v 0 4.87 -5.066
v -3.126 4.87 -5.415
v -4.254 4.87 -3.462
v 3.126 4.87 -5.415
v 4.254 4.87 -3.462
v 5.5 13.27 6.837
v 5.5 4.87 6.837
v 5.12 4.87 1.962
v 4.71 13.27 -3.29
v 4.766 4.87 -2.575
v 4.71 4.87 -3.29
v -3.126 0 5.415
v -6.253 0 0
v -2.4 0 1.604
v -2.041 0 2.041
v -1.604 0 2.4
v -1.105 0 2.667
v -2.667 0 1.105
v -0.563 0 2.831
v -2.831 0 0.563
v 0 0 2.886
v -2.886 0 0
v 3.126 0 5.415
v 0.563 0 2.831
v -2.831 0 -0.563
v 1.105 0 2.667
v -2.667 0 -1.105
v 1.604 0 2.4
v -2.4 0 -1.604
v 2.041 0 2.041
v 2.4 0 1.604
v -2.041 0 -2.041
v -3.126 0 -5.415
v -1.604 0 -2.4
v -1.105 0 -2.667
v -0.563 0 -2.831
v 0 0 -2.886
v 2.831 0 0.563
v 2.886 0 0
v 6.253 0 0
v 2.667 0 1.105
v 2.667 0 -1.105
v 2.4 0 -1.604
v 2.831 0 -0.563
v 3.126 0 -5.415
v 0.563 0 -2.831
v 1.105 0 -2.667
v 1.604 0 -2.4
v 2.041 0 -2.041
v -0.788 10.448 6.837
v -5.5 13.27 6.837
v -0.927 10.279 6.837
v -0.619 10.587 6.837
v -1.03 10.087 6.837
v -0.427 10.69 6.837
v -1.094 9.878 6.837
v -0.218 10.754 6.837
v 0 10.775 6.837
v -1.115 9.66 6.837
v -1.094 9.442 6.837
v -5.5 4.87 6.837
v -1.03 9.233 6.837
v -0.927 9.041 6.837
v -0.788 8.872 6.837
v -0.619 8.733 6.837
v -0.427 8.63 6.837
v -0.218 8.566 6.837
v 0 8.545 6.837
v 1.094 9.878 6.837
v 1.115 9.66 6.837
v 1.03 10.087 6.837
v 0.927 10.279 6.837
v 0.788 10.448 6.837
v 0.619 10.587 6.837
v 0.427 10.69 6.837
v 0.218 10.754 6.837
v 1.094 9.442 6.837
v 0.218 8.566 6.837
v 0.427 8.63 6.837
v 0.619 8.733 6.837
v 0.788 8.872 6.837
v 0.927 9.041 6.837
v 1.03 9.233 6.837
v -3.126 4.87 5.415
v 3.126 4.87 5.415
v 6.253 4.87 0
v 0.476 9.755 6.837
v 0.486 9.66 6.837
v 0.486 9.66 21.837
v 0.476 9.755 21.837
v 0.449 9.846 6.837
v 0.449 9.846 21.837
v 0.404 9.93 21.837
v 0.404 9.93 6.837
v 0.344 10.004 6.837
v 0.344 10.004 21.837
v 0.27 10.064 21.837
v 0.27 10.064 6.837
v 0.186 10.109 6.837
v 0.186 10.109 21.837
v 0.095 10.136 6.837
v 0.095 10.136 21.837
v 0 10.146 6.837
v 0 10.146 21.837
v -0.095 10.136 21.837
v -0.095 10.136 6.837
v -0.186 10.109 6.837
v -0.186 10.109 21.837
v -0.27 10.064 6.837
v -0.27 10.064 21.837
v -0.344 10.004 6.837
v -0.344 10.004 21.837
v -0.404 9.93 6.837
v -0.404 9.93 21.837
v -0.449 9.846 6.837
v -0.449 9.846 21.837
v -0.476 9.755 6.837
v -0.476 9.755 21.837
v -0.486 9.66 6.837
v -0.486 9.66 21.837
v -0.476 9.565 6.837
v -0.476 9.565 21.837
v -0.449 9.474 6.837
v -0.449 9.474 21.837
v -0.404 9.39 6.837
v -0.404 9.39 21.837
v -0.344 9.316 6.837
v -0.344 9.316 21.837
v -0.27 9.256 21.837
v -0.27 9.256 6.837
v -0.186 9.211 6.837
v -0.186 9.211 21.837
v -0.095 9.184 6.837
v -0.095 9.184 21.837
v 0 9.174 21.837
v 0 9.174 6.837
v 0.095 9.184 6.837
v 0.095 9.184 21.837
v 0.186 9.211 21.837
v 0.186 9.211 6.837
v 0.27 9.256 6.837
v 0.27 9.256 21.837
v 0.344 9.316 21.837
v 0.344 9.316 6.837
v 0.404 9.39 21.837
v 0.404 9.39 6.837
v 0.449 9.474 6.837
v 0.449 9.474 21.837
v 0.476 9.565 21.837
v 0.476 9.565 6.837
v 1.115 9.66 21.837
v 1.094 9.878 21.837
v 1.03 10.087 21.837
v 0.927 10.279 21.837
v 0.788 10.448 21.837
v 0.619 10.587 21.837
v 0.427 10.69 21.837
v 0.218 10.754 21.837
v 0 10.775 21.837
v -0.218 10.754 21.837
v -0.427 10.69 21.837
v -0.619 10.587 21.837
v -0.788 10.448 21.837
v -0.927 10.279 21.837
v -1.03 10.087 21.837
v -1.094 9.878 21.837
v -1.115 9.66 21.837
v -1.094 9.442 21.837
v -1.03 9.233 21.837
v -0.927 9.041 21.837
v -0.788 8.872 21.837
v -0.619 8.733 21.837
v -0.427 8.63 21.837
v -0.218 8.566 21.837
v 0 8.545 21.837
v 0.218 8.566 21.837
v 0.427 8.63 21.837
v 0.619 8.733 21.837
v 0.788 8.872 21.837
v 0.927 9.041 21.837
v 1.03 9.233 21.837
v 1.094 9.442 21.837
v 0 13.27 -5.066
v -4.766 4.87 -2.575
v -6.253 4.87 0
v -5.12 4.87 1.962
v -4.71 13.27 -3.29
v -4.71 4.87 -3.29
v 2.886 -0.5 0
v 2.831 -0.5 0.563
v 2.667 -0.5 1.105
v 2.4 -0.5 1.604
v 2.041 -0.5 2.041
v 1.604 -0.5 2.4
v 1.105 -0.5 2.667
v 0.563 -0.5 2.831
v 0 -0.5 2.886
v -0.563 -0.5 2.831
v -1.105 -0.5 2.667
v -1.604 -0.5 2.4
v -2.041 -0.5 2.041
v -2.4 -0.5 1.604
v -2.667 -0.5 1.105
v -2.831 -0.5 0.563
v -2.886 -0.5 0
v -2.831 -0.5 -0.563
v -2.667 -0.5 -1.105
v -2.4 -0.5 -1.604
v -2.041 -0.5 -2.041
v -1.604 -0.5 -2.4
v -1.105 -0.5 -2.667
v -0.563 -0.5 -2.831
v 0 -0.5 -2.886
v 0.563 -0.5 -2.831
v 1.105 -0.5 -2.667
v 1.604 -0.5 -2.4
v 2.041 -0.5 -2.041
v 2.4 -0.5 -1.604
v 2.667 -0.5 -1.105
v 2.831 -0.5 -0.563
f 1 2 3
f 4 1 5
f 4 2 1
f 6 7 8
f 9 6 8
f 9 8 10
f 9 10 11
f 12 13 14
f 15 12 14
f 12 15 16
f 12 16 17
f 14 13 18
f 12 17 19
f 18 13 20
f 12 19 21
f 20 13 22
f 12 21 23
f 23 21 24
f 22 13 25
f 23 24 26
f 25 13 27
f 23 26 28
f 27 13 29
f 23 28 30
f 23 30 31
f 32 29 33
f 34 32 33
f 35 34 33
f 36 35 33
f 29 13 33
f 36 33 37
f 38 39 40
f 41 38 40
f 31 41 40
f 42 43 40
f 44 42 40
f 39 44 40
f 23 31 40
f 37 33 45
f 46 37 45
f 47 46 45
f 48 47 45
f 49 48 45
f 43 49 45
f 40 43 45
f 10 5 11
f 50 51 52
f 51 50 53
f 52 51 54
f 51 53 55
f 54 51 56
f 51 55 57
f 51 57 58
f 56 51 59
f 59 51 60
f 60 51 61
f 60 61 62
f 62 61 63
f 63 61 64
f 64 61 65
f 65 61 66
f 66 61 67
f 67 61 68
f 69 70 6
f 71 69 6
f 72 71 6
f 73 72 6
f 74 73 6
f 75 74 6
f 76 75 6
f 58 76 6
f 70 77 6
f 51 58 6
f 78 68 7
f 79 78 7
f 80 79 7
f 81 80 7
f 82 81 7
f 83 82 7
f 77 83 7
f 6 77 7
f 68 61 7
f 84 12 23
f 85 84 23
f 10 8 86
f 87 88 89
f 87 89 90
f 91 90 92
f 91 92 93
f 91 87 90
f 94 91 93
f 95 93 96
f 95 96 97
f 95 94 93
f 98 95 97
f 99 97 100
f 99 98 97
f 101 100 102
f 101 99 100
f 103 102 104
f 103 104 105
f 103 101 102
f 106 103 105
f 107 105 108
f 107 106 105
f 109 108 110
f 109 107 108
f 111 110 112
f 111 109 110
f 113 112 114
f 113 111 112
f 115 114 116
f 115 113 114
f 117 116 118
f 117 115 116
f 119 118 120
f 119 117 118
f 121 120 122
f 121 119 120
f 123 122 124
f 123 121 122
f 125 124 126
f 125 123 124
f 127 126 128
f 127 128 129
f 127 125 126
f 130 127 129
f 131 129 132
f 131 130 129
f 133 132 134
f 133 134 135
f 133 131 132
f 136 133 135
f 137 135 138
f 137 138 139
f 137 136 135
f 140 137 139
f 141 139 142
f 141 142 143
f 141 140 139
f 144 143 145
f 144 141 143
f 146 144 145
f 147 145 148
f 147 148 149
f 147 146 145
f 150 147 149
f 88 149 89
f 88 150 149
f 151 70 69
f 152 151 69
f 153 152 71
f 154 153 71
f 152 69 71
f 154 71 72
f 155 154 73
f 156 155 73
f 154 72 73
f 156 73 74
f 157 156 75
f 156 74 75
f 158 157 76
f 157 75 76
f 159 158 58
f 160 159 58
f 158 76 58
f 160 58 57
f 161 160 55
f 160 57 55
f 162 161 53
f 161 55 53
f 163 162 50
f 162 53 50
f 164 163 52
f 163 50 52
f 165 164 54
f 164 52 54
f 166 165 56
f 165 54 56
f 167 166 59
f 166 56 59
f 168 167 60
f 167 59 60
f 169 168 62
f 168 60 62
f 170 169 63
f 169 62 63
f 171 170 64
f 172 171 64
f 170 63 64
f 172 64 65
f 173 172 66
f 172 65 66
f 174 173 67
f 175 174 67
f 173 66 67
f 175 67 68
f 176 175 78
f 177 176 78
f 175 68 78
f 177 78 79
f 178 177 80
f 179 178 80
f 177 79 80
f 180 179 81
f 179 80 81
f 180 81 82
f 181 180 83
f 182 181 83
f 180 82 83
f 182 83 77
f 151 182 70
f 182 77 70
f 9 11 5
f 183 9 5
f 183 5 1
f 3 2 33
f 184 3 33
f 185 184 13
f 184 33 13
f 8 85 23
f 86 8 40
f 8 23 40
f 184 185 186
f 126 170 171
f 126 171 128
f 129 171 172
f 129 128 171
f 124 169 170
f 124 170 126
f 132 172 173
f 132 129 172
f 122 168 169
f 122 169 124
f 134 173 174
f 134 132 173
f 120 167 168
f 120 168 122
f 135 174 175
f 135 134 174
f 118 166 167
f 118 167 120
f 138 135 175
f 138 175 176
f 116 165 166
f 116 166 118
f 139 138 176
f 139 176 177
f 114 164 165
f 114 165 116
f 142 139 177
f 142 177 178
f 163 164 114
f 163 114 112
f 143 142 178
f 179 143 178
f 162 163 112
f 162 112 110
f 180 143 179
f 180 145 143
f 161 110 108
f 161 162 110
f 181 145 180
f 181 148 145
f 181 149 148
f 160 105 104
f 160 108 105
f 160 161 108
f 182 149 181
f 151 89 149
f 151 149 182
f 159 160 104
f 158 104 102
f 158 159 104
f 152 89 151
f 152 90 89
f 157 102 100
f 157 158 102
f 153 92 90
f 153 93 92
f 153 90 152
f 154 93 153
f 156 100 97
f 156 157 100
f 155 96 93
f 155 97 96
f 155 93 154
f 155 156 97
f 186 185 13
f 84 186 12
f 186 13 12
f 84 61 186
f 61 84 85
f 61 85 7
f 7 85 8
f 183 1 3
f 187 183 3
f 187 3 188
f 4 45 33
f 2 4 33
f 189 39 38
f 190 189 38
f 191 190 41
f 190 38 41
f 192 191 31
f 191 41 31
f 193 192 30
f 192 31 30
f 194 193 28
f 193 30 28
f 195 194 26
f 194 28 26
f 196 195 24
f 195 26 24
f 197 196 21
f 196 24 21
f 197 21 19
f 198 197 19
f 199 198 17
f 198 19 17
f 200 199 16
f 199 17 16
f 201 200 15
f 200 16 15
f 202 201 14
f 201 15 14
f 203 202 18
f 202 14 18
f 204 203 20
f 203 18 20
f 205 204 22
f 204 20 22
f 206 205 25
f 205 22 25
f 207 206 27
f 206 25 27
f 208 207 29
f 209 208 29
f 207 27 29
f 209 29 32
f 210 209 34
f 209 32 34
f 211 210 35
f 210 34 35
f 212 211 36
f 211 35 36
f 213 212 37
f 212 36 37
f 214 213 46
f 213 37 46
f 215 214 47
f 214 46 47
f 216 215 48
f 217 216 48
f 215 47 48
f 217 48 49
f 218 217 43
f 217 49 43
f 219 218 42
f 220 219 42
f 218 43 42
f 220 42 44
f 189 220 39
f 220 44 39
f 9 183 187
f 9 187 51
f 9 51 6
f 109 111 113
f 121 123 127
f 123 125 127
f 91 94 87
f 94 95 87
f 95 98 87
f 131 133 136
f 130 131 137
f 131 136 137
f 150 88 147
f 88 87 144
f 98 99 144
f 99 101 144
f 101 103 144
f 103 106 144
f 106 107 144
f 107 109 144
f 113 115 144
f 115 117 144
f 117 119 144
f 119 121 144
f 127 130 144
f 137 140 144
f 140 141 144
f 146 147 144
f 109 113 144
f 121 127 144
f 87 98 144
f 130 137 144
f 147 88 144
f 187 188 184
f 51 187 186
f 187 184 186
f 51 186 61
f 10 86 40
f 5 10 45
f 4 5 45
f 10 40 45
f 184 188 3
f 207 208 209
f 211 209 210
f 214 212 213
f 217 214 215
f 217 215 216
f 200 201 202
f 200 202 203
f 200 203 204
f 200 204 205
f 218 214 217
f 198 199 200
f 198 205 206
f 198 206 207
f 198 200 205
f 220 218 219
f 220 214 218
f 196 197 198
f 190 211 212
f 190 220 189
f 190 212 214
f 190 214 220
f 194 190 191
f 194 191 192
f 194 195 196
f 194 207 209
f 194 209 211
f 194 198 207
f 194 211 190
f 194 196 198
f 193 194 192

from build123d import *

# Parameters (mm, degrees)
BOSS_EXTRUDE1_DEPTH = 4.87
BOSS_EXTRUDE2_DEPTH = 8.4
SKETCH3_R           = 1.115
SKETCH3_R_2         = 0.48582374
BOSS_EXTRUDE3_DEPTH = 15
SKETCH4_R           = 2.886437974
BOSS_EXTRUDE4_DEPTH = 0.5


with BuildPart() as part:
    # Sketch1 → Boss-Extrude1 (new body)
    with BuildSketch(Plane(origin=(0, 0, 0), x_dir=(1, 0, 0), z_dir=(0, 1, 0))):
        Polygon((6.252703415, 0), (3.126351708, 5.415), (-3.126351708, 5.415), (-6.252703415, 0), (-3.126351708, -5.415), (3.126351708, -5.415), align=None)
    extrude(amount=BOSS_EXTRUDE1_DEPTH)

    # Sketch2 → Boss-Extrude2 (add)
    with BuildSketch(Plane(origin=(0, 4.87, 0), x_dir=(1, 0, 0), z_dir=(0, 1, 0))):
        Polygon((0, 5.065814818), (-4.710329867, 3.289588054), (-5.5, -6.837347299), (-1.528536321, -6.837347299), (5.5, -6.837347299), (4.710329867, 3.289588054), align=None)
    extrude(amount=BOSS_EXTRUDE2_DEPTH)

    # Sketch3 → Boss-Extrude3 (add)
    with BuildSketch(Plane.XY.offset(6.837347299)):
        with Locations((0, 9.66)):
            Circle(SKETCH3_R)
        with Locations((0, 9.66)):
            Circle(SKETCH3_R_2, mode=Mode.SUBTRACT)
    extrude(amount=BOSS_EXTRUDE3_DEPTH)

    # Sketch4 → Boss-Extrude4 (add)
    with BuildSketch(Plane.XZ):
        Circle(SKETCH4_R)
    extrude(amount=BOSS_EXTRUDE4_DEPTH)


solid = part.part
